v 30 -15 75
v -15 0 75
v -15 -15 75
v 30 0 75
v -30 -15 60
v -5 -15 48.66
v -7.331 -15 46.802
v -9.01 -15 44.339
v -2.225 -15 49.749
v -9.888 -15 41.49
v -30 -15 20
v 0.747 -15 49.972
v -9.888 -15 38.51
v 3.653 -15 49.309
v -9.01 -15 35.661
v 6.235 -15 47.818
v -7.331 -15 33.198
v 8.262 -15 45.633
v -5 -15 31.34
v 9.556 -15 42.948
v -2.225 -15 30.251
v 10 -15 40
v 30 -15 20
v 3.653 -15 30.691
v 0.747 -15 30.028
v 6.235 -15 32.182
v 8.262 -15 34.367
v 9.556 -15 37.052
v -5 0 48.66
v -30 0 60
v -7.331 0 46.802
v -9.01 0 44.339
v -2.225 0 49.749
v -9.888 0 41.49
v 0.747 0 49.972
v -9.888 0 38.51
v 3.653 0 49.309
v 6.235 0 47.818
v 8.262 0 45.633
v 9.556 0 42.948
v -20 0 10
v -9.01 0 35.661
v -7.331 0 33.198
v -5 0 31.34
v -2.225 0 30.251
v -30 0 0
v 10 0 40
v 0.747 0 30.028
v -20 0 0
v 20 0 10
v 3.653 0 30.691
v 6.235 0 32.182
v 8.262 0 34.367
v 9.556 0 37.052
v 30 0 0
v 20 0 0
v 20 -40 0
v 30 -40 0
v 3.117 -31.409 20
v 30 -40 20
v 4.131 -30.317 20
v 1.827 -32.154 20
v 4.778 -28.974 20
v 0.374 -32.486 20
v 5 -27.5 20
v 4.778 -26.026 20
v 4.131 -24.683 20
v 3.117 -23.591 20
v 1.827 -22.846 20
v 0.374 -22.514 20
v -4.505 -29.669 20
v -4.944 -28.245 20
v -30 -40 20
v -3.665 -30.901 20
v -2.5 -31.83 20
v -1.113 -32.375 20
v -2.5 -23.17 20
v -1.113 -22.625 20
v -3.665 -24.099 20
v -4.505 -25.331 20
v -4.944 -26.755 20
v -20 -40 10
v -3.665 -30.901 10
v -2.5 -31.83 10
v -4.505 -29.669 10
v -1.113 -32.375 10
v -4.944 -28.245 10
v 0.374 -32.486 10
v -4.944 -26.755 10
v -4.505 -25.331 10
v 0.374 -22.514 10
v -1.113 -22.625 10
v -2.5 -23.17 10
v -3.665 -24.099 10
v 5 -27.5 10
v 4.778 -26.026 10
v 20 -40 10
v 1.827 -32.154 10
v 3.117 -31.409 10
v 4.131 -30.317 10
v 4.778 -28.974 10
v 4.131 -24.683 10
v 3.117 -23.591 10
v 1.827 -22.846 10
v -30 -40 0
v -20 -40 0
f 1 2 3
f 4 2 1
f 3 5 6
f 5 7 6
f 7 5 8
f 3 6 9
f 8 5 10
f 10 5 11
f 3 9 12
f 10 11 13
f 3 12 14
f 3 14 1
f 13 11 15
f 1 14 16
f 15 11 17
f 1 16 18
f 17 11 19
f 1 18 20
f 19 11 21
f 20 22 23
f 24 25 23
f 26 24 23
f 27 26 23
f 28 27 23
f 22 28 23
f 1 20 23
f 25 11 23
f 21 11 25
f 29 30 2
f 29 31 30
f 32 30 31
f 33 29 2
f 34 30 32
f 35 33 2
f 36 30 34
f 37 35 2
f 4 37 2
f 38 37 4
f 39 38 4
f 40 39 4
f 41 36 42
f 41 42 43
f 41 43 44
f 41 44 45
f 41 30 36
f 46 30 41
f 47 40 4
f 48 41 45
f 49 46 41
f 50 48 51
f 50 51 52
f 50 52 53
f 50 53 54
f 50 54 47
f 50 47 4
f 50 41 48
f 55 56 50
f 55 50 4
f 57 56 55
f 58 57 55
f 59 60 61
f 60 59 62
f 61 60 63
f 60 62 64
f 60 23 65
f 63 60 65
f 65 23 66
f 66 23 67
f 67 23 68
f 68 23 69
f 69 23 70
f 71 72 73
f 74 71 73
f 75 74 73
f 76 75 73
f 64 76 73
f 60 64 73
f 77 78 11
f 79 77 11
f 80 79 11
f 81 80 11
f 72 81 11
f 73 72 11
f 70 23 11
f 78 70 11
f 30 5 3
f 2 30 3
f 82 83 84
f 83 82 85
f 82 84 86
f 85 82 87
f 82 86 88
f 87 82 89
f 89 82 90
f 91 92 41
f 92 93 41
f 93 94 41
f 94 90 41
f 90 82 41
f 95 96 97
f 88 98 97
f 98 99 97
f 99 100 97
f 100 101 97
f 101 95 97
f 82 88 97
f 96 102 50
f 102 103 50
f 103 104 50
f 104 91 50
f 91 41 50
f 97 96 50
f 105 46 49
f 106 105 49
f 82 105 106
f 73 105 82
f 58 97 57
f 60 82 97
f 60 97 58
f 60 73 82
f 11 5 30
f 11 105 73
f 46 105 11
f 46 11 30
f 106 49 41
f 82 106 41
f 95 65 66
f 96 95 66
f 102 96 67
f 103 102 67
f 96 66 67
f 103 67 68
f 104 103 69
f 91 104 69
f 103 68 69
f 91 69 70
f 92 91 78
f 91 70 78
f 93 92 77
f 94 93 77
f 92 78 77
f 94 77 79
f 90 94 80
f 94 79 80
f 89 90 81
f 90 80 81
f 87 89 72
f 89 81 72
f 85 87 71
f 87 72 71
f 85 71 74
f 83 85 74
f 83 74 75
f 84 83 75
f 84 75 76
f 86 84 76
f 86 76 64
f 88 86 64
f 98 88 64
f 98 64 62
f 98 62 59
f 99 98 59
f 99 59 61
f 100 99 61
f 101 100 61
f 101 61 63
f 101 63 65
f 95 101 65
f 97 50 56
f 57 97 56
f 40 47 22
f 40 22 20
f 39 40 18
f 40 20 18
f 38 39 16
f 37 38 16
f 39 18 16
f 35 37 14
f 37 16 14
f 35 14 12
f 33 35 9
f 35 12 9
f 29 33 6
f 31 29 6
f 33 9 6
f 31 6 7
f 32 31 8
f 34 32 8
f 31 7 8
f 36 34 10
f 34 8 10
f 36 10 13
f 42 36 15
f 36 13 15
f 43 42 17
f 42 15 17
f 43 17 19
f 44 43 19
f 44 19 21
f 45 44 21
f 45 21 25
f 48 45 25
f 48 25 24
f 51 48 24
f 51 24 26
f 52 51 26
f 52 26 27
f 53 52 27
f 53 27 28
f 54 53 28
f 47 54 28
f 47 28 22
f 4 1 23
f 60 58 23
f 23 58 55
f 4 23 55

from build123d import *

# Parameters (mm, degrees)
F1_DEPTH = 40
F2_W     = 60
F2_H     = 15
F3_DEPTH = 55
F5_DEPTH = 38.1
F6_R     = 10
F7_DEPTH = 25.4
F8_R     = 5
F9_DEPTH = 25.4


with BuildPart() as f1:
    # F0 (on Front) → F1 (new body)
    with BuildSketch(Plane.XZ):
        Polygon((-30, 20), (-30, 0), (-20, 0), (-20, 10), (20, 10), (20, 0), (30, 0), (30, 20), align=None)
    extrude(amount=F1_DEPTH)

    # F2 (on face) → F3 (join)
    with BuildSketch(Plane.XY.offset(20)):
        with Locations((0, -7.5)):
            Rectangle(F2_W, F2_H)
    extrude(amount=F3_DEPTH)

    # F4 (on face) → F5 (cut)
    with BuildSketch(Plane.XZ.offset(15)):
        Polygon((-30, 60), (-15, 75), (-30, 75), align=None)
    extrude(amount=-F5_DEPTH, mode=Mode.SUBTRACT)

    # F6 (on face) → F7 (cut)
    with BuildSketch(Plane.XZ.offset(15)):
        with Locations((0, 40)):
            Circle(F6_R)
    extrude(amount=-F7_DEPTH, mode=Mode.SUBTRACT)

    # F8 (on face) → F9 (cut)
    with BuildSketch(Plane.XY.offset(20)):
        with Locations((0, -27.5)):
            Circle(F8_R)
    extrude(amount=-F9_DEPTH, mode=Mode.SUBTRACT)


solid = f1.part
